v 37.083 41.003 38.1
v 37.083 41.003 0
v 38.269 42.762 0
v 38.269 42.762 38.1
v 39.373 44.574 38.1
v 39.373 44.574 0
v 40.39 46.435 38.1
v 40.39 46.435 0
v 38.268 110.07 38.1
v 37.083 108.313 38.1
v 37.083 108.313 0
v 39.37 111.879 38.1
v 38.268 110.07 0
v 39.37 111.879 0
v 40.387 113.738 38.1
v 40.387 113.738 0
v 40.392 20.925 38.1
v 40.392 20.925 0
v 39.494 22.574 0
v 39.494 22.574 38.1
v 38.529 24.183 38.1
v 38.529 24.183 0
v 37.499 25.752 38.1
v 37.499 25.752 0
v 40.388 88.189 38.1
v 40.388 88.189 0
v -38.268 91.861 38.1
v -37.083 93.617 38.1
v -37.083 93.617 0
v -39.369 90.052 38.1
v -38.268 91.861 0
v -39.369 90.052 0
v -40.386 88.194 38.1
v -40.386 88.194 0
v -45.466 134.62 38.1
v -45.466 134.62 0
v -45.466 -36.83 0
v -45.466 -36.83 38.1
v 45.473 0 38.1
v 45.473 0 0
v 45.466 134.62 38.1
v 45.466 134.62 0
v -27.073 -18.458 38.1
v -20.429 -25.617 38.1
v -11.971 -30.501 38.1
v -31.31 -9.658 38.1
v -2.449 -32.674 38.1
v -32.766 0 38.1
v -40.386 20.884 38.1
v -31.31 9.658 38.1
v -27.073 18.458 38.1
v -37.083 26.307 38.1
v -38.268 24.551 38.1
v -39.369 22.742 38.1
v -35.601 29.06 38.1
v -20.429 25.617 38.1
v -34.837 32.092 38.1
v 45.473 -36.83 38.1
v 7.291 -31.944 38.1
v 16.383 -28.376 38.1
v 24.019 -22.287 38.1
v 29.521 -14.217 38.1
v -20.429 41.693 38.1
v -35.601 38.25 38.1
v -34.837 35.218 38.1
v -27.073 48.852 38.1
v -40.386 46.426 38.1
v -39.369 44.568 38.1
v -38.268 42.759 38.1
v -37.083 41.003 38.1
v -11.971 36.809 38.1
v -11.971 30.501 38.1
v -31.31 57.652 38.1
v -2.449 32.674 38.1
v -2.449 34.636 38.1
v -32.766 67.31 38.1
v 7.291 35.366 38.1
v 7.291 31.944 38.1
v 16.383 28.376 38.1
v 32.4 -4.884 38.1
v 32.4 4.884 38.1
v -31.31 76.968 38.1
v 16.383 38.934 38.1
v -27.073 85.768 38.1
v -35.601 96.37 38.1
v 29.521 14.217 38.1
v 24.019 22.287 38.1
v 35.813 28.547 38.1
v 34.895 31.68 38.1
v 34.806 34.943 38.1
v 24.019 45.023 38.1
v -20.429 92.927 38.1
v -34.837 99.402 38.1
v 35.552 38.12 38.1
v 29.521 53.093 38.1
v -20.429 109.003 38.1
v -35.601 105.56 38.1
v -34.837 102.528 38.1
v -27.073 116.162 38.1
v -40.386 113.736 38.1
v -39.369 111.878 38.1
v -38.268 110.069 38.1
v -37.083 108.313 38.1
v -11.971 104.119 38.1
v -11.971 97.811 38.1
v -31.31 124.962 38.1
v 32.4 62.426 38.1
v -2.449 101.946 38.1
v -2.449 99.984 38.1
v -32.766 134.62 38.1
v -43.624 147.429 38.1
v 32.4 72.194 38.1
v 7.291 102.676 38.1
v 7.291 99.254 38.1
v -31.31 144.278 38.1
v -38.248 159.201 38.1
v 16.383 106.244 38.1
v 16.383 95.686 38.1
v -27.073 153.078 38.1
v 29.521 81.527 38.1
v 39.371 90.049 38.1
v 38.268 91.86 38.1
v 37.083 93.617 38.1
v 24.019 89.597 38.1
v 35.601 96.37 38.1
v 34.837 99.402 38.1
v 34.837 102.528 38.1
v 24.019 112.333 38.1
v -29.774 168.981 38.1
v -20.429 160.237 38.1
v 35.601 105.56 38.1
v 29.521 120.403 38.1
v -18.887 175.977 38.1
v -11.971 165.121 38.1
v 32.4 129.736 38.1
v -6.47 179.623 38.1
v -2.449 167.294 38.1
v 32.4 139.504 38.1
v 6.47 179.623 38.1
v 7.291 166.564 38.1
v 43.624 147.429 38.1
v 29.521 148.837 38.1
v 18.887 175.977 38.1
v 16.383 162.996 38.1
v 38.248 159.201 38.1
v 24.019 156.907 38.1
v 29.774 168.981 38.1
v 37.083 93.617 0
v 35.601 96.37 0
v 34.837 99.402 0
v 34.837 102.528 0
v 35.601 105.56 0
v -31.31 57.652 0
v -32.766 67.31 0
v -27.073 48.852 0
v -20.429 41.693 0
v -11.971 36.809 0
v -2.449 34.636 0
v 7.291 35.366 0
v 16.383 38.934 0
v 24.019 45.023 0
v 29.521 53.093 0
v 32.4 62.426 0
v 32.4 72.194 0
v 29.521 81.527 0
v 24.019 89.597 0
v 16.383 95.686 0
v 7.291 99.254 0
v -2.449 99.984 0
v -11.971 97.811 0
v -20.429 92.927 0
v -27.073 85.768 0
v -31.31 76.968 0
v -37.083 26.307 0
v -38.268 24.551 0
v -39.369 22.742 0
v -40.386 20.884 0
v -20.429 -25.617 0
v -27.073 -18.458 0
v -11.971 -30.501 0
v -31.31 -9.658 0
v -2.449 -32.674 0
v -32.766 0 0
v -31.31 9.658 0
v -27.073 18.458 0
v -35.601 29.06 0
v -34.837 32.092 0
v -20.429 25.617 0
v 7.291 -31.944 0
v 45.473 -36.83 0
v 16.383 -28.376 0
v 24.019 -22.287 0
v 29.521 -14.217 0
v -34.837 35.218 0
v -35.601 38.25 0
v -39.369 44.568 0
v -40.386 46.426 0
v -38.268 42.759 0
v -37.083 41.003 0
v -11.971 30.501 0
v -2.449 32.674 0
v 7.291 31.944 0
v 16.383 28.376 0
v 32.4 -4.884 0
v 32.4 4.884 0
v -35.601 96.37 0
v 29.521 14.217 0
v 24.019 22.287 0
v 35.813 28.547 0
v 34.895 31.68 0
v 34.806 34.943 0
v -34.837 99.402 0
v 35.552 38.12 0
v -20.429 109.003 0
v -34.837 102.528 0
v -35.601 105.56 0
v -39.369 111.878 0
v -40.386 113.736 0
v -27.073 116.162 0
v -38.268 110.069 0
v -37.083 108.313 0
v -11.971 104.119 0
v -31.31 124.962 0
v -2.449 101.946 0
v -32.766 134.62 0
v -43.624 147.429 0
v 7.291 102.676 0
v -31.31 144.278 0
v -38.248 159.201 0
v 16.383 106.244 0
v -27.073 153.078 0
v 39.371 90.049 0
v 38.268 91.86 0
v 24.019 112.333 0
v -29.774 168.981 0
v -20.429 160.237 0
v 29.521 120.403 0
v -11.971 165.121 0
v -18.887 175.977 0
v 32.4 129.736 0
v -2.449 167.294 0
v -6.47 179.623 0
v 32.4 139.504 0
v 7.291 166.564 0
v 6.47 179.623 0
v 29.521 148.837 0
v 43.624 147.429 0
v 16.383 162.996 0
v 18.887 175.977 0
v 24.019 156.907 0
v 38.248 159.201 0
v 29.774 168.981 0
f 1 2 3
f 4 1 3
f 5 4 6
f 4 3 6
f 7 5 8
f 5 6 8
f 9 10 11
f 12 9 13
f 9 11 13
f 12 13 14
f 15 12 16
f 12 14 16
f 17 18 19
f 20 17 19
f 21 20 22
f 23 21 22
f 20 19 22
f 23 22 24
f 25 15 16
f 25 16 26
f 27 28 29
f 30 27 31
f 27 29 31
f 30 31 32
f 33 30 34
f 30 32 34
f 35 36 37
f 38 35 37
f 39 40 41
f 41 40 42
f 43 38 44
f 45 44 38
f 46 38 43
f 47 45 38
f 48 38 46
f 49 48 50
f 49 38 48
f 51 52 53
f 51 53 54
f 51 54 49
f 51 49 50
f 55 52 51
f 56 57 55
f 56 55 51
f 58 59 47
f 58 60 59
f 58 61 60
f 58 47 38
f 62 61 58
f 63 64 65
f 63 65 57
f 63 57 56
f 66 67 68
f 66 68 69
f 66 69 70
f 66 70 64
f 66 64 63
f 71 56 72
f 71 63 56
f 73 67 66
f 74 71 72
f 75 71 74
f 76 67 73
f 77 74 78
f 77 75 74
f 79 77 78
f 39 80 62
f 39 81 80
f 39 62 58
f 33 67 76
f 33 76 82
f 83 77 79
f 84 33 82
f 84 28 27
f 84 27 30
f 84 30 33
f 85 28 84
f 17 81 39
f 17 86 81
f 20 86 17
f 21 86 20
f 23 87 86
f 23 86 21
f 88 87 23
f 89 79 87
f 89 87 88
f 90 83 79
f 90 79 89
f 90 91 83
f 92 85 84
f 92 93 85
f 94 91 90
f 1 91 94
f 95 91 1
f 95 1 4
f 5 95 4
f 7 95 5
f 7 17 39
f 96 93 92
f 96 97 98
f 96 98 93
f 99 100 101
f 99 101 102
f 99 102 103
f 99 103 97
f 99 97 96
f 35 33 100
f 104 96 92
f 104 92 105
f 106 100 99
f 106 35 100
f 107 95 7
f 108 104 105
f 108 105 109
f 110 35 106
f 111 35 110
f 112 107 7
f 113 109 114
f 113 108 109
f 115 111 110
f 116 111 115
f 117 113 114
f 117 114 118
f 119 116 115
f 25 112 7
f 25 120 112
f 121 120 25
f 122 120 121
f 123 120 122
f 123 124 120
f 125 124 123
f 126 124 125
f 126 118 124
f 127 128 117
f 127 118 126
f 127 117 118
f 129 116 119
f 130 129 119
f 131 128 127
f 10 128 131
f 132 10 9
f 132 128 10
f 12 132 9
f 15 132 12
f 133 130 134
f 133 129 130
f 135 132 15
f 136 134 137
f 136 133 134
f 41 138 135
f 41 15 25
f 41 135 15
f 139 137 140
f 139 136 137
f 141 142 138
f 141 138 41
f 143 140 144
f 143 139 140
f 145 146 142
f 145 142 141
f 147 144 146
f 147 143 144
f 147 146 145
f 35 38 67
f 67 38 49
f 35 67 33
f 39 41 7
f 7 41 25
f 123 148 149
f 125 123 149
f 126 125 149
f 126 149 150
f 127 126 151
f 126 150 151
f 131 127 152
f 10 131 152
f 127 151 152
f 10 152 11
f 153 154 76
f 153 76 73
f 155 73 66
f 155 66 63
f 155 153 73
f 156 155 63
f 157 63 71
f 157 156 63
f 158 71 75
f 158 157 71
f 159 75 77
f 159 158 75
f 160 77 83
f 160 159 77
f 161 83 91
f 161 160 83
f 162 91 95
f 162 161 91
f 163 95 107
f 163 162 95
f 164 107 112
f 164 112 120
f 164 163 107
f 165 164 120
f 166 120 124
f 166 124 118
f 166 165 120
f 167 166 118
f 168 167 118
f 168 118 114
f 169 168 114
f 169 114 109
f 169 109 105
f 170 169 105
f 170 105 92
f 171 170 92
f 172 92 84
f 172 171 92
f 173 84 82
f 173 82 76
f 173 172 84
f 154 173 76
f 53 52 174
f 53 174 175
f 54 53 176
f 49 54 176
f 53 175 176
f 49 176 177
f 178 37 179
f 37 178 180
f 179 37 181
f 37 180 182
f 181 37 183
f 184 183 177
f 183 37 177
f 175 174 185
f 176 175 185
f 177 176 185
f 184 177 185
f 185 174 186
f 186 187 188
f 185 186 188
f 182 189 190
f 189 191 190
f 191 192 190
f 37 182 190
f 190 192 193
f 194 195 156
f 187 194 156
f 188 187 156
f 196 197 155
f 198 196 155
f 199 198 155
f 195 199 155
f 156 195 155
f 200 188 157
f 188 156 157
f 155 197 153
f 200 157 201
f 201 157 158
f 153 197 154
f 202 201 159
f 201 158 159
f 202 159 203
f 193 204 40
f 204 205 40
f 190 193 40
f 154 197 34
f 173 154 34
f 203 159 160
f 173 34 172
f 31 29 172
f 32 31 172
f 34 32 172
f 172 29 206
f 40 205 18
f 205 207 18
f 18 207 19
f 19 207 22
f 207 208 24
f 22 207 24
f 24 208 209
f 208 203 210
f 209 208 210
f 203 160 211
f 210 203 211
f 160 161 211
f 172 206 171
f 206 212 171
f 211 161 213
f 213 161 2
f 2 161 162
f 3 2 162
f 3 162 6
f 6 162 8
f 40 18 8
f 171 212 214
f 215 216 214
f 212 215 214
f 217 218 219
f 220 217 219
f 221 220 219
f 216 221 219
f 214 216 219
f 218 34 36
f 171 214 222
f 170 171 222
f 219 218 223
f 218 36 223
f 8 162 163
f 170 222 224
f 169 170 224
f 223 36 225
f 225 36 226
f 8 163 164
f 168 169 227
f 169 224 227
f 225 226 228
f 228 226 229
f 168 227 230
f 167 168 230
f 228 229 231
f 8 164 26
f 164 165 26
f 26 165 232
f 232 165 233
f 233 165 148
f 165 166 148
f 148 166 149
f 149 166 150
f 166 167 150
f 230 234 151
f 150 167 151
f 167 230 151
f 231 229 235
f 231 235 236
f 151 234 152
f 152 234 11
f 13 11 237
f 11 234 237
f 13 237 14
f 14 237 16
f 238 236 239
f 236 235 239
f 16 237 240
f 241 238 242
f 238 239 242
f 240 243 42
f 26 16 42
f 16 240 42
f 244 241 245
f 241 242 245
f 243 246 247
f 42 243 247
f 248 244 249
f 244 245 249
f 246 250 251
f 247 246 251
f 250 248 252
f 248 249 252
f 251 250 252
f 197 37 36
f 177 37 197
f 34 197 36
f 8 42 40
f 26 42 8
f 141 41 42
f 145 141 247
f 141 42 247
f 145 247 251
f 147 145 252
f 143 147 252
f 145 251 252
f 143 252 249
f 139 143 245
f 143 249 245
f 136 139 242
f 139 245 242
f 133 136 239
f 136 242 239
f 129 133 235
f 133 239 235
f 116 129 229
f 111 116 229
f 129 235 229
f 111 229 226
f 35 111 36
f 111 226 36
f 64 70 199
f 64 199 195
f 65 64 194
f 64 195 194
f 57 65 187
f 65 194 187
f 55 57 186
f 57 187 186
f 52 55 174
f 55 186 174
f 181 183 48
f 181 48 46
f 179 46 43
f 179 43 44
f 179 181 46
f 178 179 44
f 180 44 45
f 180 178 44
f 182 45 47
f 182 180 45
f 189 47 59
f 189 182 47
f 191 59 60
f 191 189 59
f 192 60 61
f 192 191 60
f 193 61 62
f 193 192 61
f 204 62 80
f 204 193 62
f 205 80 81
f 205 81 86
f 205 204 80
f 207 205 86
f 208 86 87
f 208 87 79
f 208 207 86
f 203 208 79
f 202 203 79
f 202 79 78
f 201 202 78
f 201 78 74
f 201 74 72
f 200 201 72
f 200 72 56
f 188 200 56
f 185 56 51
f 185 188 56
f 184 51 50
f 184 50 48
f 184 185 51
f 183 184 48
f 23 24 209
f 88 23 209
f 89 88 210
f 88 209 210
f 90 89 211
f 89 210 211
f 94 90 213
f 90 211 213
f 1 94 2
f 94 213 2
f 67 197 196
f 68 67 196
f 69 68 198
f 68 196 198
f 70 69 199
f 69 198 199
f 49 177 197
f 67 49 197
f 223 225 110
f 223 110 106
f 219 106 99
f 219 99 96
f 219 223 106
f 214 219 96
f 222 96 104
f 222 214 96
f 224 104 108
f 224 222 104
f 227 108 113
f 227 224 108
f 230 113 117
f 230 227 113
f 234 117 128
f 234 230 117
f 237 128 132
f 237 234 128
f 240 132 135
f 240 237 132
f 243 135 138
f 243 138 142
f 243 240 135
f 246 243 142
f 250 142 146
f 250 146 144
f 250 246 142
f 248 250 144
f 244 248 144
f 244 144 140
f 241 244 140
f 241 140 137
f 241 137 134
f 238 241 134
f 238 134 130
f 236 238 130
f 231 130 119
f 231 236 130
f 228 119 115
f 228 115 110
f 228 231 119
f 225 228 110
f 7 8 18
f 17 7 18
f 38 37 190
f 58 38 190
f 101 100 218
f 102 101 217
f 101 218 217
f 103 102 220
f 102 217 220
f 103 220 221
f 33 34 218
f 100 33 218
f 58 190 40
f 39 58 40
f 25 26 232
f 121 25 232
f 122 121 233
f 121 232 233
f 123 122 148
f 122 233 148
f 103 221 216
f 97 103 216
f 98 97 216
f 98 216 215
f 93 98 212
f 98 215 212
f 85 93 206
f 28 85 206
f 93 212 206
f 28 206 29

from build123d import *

# Parameters (mm, degrees)
SKETCH1_R           = 32.766
BOSS_EXTRUDE1_DEPTH = 38.1


with BuildPart() as part:
    # Sketch1 → Boss-Extrude1 (new body)
    with BuildSketch(Plane.XY):
        with BuildLine():
            ThreePointArc((45.466, 134.62), (0, 180.086), (-45.466, 134.62))
            Line((-45.466, 134.62), (-45.466, -36.83))
            Line((-45.466, -36.83), (45.472760733, -36.83))
            Line((45.472760733, -36.83), (45.472760733, 0))
            Line((45.472760733, 0), (45.466, 134.62))
        make_face()
        with Locations(Location((0, 0, 0), (0, 0, 180))):
            Circle(SKETCH1_R, mode=Mode.SUBTRACT)
        with BuildLine():
            Line((-40.386, 20.883681668), (-40.386, 46.426318332))
            ThreePointArc((-40.386, 46.426318332), (-38.829045243, 43.657042436), (-37.082505751, 41.003253275))
            ThreePointArc((-37.082505751, 41.003253275), (-34.740747581, 33.655), (-37.082505751, 26.306746725))
            ThreePointArc((-37.082505751, 26.306746725), (-38.829045243, 23.652957564), (-40.386, 20.883681668))
        make_face(mode=Mode.SUBTRACT)
        with Locations(Location((0, 67.31, 0), (0, 0, 180))):
            Circle(SKETCH1_R, mode=Mode.SUBTRACT)
        with BuildLine():
            ThreePointArc((37.082505751, 41.003253275), (38.831553537, 43.661160581), (40.390428727, 46.434885072))
            Line((40.390428727, 46.434885072), (40.391709837, 20.925359586))
            ThreePointArc((40.391709837, 20.925359586), (39.020141495, 23.38352957), (37.499160948, 25.752161572))
            ThreePointArc((37.499160948, 25.752161572), (34.745484352, 33.308169261), (37.082505751, 41.003253275))
        make_face(mode=Mode.SUBTRACT)
        with BuildLine():
            Line((-40.386, 88.193681668), (-40.386, 113.736318332))
            ThreePointArc((-40.386, 113.736318332), (-38.829045243, 110.967042436), (-37.082505751, 108.313253275))
            ThreePointArc((-37.082505751, 108.313253275), (-34.740747581, 100.965), (-37.082505751, 93.616746725))
            ThreePointArc((-37.082505751, 93.616746725), (-38.829045243, 90.962957564), (-40.386, 88.193681668))
        make_face(mode=Mode.SUBTRACT)
        with Locations(Location((0, 134.62, 0), (0, 0, 180))):
            Circle(SKETCH1_R, mode=Mode.SUBTRACT)
        with BuildLine():
            ThreePointArc((37.082505751, 108.313253275), (38.829639134, 110.968017404), (40.387048688, 113.738346468))
            Line((40.387048688, 113.738346468), (40.38833179, 88.189171708))
            ThreePointArc((40.38833179, 88.189171708), (38.830365823, 90.960789544), (37.082505751, 93.616746725))
            ThreePointArc((37.082505751, 93.616746725), (34.740747581, 100.965), (37.082505751, 108.313253275))
        make_face(mode=Mode.SUBTRACT)
    extrude(amount=BOSS_EXTRUDE1_DEPTH)


solid = part.part
